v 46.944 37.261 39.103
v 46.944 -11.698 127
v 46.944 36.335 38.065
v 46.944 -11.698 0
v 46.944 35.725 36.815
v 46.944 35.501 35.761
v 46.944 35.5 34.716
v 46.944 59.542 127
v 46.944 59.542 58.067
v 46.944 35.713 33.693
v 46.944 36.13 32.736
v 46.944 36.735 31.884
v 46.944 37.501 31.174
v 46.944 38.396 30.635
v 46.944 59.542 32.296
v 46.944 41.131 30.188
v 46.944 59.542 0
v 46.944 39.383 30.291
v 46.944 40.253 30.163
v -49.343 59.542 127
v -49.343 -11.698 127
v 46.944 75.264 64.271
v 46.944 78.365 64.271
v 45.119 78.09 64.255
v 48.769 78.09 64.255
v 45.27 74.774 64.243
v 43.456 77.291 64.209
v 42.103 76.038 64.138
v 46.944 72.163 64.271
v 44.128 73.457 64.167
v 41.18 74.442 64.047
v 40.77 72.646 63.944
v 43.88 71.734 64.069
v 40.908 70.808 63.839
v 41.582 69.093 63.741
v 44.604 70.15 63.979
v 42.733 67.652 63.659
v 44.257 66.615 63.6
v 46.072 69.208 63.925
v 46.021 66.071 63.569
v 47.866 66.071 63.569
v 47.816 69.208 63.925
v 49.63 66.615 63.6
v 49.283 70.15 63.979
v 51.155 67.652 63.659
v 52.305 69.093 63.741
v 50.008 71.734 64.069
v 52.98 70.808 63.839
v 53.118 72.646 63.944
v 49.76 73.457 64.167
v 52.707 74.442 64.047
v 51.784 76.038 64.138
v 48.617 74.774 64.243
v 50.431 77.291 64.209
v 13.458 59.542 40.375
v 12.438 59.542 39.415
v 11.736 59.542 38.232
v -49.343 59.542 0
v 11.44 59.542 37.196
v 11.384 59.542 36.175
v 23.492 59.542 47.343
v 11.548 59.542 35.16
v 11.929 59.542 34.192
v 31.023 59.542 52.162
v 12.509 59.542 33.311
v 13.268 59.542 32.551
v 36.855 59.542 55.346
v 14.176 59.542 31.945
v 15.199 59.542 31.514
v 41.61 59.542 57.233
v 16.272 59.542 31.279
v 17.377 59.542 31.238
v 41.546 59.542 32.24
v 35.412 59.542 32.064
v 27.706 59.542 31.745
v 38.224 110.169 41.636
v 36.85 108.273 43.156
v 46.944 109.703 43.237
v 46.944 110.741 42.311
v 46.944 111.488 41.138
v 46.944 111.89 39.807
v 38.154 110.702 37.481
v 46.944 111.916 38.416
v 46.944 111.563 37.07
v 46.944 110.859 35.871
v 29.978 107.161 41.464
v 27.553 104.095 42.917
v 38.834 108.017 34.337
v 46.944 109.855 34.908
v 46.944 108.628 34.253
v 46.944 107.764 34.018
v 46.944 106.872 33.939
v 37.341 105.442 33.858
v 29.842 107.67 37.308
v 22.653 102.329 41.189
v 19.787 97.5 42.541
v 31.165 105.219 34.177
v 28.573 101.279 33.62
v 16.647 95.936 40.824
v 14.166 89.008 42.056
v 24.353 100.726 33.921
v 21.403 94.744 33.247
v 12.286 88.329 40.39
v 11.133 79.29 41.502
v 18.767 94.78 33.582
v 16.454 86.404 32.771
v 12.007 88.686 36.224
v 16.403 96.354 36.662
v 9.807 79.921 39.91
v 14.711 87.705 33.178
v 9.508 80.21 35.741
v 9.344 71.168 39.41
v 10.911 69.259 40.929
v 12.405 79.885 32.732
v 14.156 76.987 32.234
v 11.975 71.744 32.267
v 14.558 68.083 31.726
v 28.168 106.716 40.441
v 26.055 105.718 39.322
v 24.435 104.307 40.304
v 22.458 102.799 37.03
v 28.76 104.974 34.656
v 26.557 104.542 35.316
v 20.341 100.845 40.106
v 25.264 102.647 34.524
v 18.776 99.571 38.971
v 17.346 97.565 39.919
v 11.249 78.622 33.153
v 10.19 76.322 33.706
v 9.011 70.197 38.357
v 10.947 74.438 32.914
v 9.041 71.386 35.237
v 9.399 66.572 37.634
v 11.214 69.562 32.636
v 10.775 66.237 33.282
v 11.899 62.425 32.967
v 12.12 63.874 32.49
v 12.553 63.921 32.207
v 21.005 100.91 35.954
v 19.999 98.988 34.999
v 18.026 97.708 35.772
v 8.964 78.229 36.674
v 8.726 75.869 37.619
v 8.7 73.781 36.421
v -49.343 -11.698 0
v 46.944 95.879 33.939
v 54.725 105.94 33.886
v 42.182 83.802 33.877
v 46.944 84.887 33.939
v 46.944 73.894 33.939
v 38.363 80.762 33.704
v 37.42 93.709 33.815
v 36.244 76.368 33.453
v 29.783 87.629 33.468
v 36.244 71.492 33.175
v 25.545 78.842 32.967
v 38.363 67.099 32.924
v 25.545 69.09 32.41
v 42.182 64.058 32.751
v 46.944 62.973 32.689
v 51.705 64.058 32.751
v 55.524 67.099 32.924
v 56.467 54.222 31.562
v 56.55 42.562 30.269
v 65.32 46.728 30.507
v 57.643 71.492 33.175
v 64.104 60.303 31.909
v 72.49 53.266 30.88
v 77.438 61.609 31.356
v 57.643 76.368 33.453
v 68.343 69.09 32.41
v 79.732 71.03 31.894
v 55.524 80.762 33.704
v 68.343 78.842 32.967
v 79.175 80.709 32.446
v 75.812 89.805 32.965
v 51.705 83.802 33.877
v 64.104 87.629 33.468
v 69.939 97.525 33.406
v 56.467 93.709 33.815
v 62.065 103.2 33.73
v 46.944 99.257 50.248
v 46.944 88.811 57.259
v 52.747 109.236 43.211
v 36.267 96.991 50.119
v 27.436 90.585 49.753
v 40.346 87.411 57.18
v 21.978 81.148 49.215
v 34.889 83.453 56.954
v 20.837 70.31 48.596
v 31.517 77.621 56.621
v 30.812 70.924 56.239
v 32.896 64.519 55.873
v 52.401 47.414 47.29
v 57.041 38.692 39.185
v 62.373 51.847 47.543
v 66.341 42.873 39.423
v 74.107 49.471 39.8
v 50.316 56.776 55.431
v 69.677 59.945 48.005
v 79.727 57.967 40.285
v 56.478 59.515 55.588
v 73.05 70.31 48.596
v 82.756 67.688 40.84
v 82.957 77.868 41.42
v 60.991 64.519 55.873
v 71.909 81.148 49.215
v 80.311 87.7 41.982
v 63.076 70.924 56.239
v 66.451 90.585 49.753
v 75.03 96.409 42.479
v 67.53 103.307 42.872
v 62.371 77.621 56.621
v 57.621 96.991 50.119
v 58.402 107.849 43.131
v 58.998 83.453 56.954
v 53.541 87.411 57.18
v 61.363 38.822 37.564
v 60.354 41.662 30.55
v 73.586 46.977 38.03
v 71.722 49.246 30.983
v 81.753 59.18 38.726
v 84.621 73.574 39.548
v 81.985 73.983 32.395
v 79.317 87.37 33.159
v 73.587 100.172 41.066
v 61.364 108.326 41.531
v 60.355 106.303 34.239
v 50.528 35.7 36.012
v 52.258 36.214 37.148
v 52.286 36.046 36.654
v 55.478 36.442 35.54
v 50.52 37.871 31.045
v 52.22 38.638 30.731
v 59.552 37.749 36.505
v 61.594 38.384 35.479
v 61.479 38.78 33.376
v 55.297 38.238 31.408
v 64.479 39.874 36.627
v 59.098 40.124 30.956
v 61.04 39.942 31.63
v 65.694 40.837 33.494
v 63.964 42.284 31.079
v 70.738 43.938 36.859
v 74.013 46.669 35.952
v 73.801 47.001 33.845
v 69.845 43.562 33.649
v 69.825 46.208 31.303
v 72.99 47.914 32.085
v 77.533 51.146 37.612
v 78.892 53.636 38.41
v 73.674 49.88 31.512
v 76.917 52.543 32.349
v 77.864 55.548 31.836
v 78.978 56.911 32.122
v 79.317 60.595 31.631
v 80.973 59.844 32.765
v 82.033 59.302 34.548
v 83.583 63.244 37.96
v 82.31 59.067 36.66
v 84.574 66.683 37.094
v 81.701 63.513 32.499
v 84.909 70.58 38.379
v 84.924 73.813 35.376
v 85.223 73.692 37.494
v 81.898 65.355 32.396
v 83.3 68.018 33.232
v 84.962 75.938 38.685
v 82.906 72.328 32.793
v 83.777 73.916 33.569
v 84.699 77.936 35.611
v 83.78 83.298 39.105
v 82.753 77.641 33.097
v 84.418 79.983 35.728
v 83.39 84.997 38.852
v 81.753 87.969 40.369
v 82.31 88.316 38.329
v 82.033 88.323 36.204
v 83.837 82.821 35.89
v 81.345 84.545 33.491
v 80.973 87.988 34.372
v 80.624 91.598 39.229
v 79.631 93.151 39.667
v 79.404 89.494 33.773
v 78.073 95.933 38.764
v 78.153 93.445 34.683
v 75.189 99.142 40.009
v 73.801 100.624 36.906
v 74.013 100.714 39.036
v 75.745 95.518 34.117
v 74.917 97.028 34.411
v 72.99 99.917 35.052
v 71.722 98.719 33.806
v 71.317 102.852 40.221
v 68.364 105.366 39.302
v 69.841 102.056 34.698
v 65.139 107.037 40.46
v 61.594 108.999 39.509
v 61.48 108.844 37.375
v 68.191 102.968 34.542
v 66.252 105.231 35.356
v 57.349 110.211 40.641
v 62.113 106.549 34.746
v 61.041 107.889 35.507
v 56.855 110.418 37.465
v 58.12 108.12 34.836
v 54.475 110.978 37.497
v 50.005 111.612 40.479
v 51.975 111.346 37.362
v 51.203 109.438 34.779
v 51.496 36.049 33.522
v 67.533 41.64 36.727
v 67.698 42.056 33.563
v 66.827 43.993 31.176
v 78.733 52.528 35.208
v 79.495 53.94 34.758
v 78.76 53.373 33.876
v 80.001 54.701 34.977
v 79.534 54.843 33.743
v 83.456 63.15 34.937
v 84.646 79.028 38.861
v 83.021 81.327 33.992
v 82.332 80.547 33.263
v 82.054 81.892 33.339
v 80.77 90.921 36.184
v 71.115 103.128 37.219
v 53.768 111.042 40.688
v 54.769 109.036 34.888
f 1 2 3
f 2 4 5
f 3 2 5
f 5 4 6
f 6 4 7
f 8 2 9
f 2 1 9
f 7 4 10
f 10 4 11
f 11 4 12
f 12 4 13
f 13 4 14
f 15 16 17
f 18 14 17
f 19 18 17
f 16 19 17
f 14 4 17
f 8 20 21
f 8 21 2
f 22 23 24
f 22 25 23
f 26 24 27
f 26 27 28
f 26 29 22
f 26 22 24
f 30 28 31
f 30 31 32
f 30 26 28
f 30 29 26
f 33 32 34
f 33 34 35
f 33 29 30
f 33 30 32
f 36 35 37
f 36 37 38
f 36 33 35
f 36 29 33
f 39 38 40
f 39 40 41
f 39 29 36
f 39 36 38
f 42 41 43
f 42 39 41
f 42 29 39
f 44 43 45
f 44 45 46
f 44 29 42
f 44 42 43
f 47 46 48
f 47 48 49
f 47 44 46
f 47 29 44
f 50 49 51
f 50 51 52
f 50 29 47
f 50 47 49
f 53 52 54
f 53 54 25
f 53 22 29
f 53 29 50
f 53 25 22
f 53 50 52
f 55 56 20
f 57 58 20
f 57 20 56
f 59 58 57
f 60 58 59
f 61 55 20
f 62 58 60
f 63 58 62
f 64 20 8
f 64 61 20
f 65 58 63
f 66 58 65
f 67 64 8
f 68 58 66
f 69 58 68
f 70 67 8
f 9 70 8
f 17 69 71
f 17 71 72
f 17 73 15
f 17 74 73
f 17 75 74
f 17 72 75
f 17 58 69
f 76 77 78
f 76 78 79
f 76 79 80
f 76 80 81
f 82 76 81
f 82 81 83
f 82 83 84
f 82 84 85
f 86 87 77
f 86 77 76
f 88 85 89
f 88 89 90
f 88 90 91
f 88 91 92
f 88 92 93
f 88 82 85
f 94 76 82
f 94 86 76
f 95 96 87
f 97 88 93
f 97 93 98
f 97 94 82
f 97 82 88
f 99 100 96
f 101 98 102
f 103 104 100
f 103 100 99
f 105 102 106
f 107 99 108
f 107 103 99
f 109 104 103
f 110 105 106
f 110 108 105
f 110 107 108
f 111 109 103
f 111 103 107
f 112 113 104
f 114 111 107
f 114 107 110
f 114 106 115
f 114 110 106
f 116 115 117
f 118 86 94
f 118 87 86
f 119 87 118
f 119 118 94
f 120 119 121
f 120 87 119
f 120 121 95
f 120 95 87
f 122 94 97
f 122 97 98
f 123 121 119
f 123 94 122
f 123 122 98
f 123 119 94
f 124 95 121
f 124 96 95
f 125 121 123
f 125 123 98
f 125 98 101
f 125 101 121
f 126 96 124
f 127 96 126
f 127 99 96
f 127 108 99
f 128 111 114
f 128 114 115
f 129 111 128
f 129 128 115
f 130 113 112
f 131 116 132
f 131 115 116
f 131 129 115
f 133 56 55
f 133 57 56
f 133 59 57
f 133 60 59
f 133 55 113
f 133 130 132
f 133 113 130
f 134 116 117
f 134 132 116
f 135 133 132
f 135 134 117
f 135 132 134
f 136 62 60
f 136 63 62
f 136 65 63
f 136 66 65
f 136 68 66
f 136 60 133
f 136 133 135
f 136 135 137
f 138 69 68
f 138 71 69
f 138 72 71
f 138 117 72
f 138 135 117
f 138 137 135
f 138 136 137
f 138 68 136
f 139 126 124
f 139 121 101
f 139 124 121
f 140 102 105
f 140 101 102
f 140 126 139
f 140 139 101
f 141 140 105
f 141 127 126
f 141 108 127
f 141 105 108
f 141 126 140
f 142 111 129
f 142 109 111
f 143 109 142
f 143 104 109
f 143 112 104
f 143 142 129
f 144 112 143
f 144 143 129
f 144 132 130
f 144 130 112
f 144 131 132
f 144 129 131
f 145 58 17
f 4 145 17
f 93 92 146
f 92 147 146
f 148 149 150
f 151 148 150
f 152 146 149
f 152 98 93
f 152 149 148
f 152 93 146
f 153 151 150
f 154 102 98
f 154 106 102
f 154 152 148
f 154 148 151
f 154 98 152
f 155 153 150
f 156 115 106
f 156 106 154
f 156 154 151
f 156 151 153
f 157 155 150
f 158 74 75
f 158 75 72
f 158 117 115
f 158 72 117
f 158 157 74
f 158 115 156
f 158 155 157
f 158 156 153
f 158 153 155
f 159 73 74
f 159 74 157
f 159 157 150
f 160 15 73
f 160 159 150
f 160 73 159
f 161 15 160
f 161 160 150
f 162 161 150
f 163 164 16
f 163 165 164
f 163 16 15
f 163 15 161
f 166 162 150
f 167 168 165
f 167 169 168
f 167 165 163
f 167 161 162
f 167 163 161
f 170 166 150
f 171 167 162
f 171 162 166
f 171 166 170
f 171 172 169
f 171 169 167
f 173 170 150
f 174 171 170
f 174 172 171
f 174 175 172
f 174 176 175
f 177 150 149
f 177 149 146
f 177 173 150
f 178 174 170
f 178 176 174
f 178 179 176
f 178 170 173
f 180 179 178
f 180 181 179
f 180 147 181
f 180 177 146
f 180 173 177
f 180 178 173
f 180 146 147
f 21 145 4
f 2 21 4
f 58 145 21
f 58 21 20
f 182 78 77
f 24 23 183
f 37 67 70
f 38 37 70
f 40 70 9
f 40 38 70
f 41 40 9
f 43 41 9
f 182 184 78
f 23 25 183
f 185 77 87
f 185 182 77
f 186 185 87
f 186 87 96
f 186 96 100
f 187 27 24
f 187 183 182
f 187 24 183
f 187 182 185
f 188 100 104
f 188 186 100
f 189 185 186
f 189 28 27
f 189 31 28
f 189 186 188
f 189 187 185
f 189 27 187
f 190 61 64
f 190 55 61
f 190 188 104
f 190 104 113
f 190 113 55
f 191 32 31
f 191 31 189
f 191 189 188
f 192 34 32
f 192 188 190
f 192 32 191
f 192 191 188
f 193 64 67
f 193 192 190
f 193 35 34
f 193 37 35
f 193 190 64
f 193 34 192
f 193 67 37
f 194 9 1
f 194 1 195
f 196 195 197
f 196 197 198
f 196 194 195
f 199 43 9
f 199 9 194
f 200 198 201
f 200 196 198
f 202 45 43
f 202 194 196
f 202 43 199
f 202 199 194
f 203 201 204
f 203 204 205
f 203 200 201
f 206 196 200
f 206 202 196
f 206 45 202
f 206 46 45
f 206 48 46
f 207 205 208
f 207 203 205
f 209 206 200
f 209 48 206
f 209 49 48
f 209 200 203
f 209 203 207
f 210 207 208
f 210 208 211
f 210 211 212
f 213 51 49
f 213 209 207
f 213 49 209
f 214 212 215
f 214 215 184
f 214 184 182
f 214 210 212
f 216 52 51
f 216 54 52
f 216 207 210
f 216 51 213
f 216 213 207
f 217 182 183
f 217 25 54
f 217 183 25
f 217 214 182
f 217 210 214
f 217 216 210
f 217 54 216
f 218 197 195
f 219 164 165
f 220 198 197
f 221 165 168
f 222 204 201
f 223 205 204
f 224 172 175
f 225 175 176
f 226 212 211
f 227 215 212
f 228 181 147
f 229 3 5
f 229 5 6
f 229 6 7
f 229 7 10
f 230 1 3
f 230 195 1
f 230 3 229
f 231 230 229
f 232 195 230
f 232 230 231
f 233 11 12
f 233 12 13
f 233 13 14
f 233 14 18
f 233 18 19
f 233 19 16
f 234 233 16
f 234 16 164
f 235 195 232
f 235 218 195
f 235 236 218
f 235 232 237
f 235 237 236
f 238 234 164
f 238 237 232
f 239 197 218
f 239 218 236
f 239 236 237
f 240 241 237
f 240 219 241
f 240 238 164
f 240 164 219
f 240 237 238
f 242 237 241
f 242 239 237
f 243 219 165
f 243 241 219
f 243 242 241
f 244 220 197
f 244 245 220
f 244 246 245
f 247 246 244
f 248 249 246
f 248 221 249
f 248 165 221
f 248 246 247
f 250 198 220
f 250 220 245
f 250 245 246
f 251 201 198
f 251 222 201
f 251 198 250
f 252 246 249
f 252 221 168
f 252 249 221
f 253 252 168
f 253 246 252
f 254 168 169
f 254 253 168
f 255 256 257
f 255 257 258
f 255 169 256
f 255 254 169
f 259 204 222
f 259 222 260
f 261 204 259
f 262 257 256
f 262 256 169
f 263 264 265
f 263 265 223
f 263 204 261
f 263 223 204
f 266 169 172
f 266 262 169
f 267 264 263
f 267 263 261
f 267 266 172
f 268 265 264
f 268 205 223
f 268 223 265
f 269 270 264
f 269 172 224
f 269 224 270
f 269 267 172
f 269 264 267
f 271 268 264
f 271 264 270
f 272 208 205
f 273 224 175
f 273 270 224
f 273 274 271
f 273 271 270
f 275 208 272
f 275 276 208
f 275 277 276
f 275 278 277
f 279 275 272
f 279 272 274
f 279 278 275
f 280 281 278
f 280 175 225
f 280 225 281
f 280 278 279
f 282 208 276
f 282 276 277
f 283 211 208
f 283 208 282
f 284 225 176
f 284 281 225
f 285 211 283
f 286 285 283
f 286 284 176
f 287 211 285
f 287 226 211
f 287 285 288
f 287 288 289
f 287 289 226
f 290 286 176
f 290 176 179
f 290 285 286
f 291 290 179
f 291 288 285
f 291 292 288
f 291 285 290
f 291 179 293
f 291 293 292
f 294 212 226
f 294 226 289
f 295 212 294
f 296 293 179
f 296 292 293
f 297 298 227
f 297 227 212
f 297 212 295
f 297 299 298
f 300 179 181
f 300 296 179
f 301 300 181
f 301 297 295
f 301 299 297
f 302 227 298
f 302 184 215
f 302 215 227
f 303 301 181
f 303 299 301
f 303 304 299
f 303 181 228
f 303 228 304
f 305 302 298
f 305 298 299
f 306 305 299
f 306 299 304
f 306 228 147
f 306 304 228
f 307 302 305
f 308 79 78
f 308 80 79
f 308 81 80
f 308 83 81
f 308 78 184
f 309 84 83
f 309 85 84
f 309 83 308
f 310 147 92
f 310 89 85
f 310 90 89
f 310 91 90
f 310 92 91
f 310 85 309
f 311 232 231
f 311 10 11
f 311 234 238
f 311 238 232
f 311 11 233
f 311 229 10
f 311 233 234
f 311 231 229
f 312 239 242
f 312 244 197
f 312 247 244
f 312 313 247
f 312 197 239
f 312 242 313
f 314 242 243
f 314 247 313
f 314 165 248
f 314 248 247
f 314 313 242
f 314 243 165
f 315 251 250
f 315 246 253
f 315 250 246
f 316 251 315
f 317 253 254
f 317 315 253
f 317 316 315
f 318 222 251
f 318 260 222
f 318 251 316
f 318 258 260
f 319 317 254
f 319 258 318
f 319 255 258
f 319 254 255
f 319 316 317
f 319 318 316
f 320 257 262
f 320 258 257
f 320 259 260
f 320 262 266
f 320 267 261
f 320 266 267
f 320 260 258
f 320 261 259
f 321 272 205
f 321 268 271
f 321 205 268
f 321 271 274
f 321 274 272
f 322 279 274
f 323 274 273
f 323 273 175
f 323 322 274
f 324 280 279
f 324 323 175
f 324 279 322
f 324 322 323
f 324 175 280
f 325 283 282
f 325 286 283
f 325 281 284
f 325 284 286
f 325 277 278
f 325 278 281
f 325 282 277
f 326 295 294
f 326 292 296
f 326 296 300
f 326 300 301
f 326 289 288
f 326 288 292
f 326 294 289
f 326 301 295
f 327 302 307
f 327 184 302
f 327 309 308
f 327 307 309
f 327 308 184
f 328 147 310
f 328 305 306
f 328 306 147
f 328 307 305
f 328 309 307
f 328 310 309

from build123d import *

# Parameters (mm, degrees)
F0_W     = 96.2870568037
F0_H     = 71.2404325604
F1_DEPTH = 127
F4_R     = 5.08


with BuildPart() as f1:
    # F0 (on Top) → F1 (new body)
    with BuildSketch(Plane.XY):
        with Locations((-1.1998191476, 23.9217914641)):
            Rectangle(F0_W, F0_H)
    extrude(amount=F1_DEPTH)

    # F2 (on face) → F3 (revolve)
    with BuildSketch(Plane.YZ.offset(46.9437092543)):
        Polygon((78.3647969365, 64.2705708742), (72.16347754, 64.2705708742), (73.8944262266, 33.9392200112), (123.555906117, 33.9392200112), align=None)
    revolve(axis=Axis((46.9437092543, 73.0289518833, 49.1048954427), (0, -0.0569752704, 0.9983755899)))

    # F4
    f4_edges = [f1.edges().sort_by_distance(p)[0] for p in [
        (7.075019, 103.482224, 32.793656),
    ]]
    fillet(f4_edges, radius=F4_R)


solid = f1.part
